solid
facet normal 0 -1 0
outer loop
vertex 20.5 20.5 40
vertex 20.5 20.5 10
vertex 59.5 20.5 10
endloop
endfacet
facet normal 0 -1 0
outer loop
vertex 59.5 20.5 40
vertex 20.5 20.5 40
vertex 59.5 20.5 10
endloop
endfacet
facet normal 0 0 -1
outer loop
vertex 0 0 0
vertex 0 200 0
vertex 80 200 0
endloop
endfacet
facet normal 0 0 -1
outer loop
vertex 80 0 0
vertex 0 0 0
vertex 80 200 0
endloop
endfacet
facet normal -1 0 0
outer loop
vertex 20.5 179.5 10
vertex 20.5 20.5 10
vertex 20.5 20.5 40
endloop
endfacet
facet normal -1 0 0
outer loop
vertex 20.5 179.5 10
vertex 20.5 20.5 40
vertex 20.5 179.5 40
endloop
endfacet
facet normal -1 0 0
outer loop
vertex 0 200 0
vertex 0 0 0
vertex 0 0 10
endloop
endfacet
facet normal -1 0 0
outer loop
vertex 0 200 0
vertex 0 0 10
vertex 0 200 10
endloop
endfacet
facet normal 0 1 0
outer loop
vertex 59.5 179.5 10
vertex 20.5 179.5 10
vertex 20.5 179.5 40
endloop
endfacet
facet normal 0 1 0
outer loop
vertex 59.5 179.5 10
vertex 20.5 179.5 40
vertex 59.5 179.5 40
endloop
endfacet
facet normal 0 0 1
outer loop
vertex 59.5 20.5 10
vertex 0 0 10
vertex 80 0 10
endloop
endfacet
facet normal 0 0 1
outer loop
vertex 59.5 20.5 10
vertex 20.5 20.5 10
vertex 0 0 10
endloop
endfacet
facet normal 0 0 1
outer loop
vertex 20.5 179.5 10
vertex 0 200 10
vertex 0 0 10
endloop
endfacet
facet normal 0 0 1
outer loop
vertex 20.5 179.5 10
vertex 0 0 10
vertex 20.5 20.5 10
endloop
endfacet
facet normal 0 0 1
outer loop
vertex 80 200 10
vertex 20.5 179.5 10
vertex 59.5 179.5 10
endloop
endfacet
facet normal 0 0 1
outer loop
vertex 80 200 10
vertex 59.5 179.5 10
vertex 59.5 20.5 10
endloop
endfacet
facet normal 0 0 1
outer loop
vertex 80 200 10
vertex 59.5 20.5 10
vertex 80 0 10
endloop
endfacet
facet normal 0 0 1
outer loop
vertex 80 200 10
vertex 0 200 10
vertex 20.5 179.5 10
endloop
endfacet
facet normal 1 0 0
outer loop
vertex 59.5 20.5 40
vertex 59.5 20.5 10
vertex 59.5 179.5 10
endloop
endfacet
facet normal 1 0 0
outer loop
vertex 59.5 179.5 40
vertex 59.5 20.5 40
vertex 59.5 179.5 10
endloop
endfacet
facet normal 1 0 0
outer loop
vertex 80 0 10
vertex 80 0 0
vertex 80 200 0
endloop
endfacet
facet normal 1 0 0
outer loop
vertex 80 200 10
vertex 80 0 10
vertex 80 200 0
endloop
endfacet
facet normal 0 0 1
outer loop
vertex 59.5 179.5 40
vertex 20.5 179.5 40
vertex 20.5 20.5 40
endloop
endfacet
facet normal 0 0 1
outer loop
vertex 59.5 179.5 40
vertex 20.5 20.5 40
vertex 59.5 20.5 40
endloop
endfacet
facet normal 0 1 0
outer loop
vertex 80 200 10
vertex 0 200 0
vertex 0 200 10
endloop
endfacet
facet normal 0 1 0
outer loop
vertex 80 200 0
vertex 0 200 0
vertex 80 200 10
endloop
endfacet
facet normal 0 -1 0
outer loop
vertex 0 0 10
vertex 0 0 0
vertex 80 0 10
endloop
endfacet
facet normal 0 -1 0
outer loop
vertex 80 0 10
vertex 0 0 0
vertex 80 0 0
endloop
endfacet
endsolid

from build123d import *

# Parameters (mm, degrees)
F0_W     = 80
F0_H     = 200
F0_W_2   = 39
F0_H_2   = 159
F1_DEPTH = 10
F2_DEPTH = 40


with BuildPart() as f1:
    # F0 (on Top) → F1 (new body)
    with BuildSketch(Plane.XY):
        with Locations((40, 100)):
            Rectangle(F0_W, F0_H)
        with Locations((40, 100)):
            Rectangle(F0_W_2, F0_H_2, mode=Mode.SUBTRACT)
    extrude(amount=F1_DEPTH)

    # F0 (on Top) → F2 (join)
    with BuildSketch(Plane.XY):
        with Locations((40, 100)):
            Rectangle(F0_W_2, F0_H_2)
    extrude(amount=F2_DEPTH)


solid = f1.part
